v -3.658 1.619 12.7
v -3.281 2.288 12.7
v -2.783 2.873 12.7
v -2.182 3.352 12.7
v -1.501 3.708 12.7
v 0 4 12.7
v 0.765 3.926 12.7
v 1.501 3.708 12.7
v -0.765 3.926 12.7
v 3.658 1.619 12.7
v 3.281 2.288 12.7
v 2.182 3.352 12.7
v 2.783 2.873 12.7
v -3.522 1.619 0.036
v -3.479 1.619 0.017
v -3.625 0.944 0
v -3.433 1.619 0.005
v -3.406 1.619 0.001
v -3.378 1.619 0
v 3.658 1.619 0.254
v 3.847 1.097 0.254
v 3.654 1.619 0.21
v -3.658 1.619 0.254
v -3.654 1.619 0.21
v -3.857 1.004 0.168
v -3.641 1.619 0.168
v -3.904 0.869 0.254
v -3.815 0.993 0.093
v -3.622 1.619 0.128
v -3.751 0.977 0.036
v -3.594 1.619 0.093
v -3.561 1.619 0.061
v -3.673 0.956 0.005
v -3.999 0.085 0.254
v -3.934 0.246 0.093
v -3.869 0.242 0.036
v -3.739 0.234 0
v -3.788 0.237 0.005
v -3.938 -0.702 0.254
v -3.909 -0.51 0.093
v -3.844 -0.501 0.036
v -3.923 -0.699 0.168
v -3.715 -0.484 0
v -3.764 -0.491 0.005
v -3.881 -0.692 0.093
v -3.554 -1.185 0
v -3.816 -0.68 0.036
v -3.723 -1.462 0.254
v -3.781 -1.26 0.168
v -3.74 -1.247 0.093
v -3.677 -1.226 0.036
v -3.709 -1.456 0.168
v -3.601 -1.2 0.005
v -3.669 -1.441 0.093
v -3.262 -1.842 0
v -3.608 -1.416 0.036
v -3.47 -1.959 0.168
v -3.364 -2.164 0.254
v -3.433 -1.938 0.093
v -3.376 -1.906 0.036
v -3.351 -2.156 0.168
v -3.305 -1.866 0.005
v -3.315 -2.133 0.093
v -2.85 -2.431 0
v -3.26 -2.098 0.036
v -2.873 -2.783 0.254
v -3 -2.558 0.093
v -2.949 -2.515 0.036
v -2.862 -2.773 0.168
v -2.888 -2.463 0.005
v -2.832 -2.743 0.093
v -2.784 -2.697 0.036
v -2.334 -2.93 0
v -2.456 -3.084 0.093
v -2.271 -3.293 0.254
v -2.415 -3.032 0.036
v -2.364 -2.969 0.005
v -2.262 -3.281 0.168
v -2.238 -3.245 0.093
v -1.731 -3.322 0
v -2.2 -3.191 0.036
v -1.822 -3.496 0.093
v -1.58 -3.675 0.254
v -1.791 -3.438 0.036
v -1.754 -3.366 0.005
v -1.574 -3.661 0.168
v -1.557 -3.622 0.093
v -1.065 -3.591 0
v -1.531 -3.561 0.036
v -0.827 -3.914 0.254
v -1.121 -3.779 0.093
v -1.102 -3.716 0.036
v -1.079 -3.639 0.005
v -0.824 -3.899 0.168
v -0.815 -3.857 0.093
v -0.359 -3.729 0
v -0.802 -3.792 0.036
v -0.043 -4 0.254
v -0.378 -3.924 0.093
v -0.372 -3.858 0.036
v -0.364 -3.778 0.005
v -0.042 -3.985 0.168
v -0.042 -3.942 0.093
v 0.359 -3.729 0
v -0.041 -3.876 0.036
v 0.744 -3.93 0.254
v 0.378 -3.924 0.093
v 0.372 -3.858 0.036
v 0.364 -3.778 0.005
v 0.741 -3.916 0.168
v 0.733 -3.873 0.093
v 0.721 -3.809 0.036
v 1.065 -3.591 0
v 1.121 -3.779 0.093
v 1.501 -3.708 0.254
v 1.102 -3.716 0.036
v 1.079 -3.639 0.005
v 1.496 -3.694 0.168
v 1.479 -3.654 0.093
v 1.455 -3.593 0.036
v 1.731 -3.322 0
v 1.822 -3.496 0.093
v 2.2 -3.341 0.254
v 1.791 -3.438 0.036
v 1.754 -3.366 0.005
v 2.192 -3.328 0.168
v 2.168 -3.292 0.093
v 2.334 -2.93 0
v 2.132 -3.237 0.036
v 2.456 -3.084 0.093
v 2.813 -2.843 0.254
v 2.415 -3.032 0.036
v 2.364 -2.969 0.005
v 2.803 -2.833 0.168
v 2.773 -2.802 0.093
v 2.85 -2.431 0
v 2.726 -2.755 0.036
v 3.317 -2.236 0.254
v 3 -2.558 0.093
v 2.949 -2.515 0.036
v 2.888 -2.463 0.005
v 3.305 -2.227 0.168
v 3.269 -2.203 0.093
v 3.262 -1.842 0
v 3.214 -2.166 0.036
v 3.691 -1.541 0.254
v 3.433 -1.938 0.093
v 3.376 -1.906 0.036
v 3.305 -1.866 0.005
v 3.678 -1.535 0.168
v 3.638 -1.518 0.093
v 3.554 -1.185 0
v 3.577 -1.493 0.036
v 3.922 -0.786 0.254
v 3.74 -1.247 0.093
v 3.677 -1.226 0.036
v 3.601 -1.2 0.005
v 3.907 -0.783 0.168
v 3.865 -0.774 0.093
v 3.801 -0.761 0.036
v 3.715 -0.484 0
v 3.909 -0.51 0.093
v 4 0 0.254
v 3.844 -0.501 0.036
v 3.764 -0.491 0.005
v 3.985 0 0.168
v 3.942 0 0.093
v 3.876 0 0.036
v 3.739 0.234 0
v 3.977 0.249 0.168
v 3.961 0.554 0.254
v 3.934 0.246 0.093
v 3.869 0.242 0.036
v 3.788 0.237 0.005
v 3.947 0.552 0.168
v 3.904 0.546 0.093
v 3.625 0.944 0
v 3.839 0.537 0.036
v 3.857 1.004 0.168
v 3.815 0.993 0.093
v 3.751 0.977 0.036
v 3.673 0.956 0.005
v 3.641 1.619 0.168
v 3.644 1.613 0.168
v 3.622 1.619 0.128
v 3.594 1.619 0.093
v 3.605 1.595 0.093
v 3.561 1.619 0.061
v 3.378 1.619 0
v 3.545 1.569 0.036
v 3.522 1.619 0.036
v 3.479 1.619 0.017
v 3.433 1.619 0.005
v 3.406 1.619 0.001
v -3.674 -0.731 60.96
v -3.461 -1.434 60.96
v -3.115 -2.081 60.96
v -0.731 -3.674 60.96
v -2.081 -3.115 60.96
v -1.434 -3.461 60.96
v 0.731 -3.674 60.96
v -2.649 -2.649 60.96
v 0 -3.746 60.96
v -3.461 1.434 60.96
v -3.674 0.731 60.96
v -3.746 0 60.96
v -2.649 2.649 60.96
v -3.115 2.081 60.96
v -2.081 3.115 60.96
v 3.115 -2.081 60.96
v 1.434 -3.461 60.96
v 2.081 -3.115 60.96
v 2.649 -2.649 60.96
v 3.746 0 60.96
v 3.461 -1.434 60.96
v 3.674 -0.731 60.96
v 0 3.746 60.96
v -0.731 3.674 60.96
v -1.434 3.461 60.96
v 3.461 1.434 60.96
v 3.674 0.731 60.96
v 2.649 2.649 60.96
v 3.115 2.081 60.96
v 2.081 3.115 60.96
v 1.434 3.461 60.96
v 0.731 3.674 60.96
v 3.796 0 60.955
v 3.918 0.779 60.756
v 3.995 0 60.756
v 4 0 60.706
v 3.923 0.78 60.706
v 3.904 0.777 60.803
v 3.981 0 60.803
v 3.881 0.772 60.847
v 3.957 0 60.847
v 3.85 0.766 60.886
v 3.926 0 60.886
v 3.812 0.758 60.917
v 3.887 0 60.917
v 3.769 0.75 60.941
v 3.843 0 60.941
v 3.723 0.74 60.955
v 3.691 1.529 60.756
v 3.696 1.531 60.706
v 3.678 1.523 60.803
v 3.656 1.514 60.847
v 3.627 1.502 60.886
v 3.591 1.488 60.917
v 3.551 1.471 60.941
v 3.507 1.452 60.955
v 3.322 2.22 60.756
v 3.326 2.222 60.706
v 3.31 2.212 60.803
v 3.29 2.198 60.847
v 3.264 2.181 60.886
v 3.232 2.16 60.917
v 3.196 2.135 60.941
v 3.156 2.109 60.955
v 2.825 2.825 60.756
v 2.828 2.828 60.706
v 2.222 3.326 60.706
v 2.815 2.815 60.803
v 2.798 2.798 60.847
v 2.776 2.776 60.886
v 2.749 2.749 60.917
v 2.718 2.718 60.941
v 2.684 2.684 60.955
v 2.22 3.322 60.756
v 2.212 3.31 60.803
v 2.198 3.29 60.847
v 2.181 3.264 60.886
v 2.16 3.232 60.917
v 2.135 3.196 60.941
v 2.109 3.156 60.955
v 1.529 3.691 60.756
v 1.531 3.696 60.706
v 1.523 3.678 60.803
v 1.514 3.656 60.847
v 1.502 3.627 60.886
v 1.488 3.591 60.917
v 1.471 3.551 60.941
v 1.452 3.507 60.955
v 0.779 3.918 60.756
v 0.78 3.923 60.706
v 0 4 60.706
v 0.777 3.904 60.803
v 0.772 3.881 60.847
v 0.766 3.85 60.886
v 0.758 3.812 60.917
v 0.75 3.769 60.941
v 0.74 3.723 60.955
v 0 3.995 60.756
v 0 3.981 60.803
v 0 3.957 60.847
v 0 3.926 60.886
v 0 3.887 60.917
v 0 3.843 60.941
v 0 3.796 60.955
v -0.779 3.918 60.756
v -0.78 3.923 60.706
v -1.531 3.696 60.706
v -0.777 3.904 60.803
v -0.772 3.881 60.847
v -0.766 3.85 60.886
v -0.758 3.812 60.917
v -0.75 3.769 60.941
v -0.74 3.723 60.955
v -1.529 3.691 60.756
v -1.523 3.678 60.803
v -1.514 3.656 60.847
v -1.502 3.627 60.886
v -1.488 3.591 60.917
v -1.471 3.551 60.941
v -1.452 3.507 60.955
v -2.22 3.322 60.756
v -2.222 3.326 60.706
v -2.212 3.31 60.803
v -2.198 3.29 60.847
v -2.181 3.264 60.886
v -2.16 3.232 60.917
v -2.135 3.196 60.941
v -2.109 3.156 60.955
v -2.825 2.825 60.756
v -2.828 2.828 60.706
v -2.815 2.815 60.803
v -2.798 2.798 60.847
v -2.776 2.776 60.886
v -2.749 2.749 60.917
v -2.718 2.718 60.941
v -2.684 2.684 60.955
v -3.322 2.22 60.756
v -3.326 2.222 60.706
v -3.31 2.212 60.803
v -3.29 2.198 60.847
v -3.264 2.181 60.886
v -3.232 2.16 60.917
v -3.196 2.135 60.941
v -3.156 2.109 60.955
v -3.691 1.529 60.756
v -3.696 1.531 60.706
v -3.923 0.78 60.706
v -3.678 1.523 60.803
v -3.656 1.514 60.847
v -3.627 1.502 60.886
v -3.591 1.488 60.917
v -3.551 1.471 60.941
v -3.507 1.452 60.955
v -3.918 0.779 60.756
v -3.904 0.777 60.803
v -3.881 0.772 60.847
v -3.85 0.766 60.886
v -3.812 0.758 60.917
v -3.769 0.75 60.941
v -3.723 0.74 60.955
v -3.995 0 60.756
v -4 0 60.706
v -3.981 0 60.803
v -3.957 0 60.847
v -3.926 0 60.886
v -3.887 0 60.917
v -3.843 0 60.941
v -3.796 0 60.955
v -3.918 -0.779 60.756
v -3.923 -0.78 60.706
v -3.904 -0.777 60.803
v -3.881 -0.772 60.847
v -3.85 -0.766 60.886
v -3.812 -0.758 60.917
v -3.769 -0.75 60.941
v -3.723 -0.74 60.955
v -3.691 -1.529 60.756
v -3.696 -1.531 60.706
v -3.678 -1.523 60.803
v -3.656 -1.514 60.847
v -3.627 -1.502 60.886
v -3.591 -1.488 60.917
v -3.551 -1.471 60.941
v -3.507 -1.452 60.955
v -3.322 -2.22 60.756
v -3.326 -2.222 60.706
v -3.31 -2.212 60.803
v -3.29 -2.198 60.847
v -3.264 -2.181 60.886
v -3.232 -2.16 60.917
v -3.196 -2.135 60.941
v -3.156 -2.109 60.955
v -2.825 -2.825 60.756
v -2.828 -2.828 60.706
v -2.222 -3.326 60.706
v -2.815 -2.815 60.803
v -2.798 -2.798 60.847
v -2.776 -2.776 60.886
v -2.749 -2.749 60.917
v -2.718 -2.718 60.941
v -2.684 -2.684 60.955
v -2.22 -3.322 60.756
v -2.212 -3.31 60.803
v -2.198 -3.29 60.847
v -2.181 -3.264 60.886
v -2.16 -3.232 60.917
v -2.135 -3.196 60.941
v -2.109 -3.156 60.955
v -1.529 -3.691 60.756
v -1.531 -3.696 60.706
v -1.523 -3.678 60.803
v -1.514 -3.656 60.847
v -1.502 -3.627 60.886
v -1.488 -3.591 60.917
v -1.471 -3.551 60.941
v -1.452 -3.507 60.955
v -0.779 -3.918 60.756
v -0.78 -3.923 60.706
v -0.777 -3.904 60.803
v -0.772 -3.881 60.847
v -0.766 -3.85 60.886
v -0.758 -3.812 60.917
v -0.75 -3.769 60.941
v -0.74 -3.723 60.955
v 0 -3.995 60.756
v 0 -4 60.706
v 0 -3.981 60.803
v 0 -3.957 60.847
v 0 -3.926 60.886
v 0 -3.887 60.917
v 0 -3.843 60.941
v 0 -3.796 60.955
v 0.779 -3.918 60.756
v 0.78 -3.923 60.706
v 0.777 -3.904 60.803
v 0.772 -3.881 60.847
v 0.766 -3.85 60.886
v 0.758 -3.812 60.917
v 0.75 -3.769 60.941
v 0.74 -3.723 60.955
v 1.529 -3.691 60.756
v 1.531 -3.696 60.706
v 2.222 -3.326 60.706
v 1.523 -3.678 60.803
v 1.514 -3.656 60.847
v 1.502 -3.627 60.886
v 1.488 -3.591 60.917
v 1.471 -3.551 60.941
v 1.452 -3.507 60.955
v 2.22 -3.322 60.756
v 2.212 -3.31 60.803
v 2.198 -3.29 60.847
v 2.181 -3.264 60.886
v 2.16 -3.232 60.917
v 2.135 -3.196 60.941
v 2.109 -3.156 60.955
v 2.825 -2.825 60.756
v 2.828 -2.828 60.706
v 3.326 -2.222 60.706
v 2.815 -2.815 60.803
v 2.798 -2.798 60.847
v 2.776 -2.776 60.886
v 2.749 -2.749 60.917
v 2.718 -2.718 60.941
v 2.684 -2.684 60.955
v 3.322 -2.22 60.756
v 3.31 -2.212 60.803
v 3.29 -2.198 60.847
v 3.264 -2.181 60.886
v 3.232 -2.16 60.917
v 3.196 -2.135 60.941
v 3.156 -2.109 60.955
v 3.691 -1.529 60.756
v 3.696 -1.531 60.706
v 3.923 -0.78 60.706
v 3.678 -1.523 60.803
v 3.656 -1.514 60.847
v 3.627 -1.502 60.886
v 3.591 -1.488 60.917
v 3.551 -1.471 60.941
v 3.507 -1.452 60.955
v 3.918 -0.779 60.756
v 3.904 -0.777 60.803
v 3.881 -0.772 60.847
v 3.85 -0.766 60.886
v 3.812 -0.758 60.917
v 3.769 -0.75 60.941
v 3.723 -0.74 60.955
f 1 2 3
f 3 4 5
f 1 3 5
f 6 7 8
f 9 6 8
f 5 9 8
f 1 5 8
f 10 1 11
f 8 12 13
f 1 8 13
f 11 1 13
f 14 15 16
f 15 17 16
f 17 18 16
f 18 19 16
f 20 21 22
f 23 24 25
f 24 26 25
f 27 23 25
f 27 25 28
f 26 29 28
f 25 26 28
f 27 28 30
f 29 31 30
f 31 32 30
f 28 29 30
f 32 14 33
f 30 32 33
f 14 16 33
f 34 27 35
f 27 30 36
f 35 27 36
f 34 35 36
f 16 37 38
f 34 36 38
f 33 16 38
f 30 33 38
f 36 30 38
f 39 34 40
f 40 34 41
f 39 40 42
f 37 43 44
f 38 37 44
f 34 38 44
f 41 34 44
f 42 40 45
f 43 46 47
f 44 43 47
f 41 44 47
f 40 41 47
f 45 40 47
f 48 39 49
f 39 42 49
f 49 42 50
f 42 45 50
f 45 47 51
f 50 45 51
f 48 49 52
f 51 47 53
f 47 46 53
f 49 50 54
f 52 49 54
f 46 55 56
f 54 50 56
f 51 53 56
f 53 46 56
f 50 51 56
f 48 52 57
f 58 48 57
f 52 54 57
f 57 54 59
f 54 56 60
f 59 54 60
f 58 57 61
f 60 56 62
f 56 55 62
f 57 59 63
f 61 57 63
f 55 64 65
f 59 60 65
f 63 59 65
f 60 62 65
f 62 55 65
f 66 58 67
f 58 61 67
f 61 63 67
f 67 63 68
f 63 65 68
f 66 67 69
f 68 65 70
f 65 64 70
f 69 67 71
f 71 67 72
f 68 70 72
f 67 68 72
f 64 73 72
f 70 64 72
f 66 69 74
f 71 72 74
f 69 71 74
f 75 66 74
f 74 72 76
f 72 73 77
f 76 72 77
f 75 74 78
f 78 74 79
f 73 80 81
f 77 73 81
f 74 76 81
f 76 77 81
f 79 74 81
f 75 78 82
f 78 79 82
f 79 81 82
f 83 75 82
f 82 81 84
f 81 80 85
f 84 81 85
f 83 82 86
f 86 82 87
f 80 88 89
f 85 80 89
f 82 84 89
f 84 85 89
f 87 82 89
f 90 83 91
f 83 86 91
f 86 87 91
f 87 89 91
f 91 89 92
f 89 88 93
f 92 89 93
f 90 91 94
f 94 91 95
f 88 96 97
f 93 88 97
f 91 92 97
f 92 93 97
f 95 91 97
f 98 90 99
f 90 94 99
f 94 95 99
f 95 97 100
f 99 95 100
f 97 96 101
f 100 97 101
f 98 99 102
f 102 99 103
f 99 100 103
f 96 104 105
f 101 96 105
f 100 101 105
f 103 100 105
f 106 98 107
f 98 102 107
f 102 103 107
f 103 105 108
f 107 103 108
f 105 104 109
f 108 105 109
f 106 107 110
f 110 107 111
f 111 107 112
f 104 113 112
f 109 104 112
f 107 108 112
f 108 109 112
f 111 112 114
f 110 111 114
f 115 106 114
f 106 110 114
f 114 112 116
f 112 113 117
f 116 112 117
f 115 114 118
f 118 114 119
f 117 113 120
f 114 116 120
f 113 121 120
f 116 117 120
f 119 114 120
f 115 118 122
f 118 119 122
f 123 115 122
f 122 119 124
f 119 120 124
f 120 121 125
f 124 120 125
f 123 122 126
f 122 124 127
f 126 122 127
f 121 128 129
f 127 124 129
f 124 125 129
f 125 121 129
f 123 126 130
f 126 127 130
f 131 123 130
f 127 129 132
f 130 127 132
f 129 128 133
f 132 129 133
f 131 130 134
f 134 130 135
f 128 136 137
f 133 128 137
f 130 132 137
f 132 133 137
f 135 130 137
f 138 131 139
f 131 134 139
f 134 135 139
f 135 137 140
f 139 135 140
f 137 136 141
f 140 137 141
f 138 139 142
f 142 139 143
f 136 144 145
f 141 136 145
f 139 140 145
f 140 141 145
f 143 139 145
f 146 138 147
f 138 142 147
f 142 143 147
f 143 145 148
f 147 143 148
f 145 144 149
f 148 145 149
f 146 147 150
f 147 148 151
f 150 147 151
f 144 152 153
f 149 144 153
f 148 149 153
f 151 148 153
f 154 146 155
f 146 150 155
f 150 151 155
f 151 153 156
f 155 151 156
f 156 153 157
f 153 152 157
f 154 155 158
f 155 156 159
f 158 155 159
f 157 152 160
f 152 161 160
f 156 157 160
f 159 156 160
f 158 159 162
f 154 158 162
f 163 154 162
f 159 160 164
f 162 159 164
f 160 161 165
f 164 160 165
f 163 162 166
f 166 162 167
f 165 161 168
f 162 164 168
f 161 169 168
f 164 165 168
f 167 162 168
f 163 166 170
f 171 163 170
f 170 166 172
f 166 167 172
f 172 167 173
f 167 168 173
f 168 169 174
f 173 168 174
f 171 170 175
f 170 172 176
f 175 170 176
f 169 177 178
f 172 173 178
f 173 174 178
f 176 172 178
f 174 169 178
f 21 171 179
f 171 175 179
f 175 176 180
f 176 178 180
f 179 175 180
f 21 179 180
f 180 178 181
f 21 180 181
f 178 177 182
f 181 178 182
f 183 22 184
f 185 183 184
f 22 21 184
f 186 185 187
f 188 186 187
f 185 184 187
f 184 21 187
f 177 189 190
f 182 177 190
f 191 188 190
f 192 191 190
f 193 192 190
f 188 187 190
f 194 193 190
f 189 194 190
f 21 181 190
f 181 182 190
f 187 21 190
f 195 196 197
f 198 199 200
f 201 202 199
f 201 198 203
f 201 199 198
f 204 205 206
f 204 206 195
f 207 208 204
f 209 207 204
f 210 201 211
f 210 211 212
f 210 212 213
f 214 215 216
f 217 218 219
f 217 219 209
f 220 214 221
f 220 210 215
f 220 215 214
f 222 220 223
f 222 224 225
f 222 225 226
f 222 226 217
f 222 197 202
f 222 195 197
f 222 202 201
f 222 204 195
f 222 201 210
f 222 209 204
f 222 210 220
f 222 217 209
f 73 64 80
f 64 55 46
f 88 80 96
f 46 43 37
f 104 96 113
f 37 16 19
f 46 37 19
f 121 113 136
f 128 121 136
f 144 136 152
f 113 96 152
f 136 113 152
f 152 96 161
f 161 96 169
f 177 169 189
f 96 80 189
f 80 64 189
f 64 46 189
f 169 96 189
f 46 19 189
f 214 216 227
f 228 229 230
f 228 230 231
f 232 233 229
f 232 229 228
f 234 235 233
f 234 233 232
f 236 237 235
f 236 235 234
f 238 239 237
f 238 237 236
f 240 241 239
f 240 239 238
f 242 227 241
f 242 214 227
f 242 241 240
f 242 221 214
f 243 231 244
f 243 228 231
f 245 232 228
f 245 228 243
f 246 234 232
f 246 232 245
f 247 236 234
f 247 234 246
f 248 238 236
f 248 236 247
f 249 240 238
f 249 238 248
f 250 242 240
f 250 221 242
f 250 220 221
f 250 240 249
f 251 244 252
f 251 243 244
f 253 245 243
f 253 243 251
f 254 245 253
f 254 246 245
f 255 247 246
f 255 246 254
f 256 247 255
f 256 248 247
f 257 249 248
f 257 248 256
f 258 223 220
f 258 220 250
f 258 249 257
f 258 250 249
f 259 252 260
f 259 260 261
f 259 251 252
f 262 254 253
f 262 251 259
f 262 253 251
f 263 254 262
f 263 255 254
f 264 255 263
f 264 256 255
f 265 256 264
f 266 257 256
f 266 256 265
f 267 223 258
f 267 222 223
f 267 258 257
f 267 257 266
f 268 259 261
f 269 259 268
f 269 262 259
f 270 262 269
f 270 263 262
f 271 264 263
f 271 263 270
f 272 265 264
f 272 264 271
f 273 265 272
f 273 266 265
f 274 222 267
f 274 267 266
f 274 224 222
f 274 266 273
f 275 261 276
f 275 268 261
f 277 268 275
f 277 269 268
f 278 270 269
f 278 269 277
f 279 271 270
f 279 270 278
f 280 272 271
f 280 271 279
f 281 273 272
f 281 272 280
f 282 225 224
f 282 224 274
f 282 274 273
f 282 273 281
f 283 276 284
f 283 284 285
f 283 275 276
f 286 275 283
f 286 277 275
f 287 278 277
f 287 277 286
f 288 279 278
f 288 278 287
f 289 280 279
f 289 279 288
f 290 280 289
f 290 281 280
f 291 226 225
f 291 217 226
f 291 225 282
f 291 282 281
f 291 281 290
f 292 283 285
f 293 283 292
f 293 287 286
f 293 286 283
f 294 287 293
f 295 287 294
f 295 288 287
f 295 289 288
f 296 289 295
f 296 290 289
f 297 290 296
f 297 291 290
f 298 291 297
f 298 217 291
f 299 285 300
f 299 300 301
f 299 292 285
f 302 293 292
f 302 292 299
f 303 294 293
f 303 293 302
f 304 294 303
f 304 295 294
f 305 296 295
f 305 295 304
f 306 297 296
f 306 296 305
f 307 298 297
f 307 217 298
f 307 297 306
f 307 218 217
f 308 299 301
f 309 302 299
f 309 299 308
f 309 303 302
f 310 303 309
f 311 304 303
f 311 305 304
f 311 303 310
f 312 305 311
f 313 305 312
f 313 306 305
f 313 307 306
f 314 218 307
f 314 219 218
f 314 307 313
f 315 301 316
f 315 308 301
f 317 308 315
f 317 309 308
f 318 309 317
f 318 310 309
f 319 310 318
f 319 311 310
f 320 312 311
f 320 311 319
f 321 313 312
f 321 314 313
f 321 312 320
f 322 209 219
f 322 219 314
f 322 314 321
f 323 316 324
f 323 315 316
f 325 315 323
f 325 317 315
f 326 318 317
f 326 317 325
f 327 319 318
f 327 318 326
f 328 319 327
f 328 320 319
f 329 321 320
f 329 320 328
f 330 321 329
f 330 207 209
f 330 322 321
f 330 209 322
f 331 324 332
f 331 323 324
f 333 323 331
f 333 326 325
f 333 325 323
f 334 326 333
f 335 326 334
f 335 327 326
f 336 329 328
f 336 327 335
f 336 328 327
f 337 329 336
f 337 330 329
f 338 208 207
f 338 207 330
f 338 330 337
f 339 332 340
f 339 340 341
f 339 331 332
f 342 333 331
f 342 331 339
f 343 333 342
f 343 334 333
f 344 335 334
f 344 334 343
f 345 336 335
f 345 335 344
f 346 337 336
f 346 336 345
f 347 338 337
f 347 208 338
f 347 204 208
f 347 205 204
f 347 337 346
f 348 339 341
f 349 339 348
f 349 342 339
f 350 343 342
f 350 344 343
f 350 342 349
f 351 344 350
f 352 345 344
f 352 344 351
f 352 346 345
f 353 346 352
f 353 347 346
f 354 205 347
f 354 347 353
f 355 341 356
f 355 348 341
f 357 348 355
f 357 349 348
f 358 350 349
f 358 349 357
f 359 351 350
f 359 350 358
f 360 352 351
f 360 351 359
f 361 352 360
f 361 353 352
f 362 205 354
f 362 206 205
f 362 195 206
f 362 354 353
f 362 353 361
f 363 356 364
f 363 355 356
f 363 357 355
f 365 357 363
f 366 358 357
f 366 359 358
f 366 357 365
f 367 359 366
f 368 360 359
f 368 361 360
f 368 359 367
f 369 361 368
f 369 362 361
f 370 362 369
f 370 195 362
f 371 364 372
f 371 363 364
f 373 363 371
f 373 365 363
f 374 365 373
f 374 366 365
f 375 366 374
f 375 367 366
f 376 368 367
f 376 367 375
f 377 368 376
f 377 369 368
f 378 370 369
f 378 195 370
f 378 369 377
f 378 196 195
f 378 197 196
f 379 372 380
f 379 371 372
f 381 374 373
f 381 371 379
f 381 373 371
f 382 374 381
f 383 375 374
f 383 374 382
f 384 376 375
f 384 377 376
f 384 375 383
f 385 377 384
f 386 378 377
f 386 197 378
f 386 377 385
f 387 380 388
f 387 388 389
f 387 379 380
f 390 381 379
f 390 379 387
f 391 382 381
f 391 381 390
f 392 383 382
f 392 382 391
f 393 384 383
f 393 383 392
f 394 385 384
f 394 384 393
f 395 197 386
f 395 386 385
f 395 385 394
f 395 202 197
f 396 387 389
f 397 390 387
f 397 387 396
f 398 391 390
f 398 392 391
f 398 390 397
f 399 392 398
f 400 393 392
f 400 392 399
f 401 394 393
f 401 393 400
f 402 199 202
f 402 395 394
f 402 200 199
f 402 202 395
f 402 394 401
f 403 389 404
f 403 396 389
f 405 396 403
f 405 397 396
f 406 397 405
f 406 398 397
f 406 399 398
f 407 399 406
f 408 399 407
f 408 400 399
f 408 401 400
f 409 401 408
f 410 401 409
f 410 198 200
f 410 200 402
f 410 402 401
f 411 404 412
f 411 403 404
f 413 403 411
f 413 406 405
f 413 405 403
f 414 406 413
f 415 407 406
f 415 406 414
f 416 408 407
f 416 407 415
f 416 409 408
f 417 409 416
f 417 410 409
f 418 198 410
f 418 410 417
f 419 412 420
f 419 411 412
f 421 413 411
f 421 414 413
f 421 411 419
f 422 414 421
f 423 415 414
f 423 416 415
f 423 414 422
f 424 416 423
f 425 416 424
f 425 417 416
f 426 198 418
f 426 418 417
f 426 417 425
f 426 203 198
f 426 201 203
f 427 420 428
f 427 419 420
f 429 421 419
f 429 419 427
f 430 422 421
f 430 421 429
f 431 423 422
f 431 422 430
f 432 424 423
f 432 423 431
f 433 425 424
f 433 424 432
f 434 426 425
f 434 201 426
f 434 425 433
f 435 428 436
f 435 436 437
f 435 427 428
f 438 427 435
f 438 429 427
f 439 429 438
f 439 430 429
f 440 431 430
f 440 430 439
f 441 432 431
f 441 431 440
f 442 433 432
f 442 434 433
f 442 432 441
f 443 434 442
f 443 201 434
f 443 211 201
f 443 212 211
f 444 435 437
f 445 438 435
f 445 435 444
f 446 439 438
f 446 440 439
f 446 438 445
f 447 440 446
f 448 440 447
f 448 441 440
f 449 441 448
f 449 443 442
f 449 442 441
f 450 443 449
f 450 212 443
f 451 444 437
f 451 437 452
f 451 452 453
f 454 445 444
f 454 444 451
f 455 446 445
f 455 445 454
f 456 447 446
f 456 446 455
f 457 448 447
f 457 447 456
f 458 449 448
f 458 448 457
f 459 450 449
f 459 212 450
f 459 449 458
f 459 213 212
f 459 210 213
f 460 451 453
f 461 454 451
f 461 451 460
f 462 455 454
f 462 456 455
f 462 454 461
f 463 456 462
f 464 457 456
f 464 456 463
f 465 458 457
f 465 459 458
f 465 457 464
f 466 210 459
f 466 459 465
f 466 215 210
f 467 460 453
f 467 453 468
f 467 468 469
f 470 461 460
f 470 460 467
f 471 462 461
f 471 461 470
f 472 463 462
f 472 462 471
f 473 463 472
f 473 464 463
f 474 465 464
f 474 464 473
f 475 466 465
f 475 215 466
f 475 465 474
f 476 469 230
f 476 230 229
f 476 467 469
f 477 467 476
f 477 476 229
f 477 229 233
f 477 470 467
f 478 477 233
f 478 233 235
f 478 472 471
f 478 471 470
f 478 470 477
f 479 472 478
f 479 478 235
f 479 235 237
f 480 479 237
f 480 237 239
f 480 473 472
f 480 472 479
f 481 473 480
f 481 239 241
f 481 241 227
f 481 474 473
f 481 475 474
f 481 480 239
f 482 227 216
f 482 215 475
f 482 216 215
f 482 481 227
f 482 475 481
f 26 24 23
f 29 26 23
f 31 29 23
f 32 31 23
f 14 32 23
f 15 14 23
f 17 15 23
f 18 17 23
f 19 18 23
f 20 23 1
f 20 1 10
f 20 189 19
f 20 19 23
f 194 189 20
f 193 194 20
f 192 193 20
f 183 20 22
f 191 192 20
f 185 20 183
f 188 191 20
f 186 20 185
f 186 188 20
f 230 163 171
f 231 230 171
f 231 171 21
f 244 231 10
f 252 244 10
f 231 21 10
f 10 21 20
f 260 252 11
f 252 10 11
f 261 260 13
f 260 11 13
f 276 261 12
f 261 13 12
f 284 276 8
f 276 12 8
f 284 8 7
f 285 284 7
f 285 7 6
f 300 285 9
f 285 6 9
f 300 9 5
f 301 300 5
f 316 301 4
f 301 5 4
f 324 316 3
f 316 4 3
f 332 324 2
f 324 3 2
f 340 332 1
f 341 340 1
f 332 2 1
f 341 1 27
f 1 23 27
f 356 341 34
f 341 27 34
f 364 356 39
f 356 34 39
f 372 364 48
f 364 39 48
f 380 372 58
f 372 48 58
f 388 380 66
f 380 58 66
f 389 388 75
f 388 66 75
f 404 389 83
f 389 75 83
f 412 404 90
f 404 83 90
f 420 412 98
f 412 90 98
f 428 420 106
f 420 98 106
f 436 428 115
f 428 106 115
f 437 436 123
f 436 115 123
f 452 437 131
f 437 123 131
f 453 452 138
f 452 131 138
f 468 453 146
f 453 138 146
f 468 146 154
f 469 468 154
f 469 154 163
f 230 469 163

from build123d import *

# Parameters (mm, degrees)
SKETCH1_R           = 4
BOSS_EXTRUDE1_DEPTH = 60.96
FILLET2_R           = 0.254
SKETCH2_W           = 8
SKETCH2_H           = 12.7
CUT_EXTRUDE1_DEPTH  = 2.38125


with BuildPart() as part:
    # Sketch1 → Boss-Extrude1 (new body)
    with BuildSketch(Plane.XY):
        Circle(SKETCH1_R)
    extrude(amount=BOSS_EXTRUDE1_DEPTH)

    # Fillet2
    fillet2_edges = [part.edges().sort_by_distance(p)[0] for p in [
        (-4, 0, 0),
        (-4, 0, 60.96),
    ]]
    fillet(fillet2_edges, radius=FILLET2_R)

    # Sketch2 → Cut-Extrude1 (cut)
    with BuildSketch(Plane(origin=(0, 4, 0), x_dir=(1, 0, 0), z_dir=(0, 1, 0))):
        with Locations((0, -6.35)):
            Rectangle(SKETCH2_W, SKETCH2_H)
    extrude(amount=-CUT_EXTRUDE1_DEPTH, mode=Mode.SUBTRACT)


solid = part.part
